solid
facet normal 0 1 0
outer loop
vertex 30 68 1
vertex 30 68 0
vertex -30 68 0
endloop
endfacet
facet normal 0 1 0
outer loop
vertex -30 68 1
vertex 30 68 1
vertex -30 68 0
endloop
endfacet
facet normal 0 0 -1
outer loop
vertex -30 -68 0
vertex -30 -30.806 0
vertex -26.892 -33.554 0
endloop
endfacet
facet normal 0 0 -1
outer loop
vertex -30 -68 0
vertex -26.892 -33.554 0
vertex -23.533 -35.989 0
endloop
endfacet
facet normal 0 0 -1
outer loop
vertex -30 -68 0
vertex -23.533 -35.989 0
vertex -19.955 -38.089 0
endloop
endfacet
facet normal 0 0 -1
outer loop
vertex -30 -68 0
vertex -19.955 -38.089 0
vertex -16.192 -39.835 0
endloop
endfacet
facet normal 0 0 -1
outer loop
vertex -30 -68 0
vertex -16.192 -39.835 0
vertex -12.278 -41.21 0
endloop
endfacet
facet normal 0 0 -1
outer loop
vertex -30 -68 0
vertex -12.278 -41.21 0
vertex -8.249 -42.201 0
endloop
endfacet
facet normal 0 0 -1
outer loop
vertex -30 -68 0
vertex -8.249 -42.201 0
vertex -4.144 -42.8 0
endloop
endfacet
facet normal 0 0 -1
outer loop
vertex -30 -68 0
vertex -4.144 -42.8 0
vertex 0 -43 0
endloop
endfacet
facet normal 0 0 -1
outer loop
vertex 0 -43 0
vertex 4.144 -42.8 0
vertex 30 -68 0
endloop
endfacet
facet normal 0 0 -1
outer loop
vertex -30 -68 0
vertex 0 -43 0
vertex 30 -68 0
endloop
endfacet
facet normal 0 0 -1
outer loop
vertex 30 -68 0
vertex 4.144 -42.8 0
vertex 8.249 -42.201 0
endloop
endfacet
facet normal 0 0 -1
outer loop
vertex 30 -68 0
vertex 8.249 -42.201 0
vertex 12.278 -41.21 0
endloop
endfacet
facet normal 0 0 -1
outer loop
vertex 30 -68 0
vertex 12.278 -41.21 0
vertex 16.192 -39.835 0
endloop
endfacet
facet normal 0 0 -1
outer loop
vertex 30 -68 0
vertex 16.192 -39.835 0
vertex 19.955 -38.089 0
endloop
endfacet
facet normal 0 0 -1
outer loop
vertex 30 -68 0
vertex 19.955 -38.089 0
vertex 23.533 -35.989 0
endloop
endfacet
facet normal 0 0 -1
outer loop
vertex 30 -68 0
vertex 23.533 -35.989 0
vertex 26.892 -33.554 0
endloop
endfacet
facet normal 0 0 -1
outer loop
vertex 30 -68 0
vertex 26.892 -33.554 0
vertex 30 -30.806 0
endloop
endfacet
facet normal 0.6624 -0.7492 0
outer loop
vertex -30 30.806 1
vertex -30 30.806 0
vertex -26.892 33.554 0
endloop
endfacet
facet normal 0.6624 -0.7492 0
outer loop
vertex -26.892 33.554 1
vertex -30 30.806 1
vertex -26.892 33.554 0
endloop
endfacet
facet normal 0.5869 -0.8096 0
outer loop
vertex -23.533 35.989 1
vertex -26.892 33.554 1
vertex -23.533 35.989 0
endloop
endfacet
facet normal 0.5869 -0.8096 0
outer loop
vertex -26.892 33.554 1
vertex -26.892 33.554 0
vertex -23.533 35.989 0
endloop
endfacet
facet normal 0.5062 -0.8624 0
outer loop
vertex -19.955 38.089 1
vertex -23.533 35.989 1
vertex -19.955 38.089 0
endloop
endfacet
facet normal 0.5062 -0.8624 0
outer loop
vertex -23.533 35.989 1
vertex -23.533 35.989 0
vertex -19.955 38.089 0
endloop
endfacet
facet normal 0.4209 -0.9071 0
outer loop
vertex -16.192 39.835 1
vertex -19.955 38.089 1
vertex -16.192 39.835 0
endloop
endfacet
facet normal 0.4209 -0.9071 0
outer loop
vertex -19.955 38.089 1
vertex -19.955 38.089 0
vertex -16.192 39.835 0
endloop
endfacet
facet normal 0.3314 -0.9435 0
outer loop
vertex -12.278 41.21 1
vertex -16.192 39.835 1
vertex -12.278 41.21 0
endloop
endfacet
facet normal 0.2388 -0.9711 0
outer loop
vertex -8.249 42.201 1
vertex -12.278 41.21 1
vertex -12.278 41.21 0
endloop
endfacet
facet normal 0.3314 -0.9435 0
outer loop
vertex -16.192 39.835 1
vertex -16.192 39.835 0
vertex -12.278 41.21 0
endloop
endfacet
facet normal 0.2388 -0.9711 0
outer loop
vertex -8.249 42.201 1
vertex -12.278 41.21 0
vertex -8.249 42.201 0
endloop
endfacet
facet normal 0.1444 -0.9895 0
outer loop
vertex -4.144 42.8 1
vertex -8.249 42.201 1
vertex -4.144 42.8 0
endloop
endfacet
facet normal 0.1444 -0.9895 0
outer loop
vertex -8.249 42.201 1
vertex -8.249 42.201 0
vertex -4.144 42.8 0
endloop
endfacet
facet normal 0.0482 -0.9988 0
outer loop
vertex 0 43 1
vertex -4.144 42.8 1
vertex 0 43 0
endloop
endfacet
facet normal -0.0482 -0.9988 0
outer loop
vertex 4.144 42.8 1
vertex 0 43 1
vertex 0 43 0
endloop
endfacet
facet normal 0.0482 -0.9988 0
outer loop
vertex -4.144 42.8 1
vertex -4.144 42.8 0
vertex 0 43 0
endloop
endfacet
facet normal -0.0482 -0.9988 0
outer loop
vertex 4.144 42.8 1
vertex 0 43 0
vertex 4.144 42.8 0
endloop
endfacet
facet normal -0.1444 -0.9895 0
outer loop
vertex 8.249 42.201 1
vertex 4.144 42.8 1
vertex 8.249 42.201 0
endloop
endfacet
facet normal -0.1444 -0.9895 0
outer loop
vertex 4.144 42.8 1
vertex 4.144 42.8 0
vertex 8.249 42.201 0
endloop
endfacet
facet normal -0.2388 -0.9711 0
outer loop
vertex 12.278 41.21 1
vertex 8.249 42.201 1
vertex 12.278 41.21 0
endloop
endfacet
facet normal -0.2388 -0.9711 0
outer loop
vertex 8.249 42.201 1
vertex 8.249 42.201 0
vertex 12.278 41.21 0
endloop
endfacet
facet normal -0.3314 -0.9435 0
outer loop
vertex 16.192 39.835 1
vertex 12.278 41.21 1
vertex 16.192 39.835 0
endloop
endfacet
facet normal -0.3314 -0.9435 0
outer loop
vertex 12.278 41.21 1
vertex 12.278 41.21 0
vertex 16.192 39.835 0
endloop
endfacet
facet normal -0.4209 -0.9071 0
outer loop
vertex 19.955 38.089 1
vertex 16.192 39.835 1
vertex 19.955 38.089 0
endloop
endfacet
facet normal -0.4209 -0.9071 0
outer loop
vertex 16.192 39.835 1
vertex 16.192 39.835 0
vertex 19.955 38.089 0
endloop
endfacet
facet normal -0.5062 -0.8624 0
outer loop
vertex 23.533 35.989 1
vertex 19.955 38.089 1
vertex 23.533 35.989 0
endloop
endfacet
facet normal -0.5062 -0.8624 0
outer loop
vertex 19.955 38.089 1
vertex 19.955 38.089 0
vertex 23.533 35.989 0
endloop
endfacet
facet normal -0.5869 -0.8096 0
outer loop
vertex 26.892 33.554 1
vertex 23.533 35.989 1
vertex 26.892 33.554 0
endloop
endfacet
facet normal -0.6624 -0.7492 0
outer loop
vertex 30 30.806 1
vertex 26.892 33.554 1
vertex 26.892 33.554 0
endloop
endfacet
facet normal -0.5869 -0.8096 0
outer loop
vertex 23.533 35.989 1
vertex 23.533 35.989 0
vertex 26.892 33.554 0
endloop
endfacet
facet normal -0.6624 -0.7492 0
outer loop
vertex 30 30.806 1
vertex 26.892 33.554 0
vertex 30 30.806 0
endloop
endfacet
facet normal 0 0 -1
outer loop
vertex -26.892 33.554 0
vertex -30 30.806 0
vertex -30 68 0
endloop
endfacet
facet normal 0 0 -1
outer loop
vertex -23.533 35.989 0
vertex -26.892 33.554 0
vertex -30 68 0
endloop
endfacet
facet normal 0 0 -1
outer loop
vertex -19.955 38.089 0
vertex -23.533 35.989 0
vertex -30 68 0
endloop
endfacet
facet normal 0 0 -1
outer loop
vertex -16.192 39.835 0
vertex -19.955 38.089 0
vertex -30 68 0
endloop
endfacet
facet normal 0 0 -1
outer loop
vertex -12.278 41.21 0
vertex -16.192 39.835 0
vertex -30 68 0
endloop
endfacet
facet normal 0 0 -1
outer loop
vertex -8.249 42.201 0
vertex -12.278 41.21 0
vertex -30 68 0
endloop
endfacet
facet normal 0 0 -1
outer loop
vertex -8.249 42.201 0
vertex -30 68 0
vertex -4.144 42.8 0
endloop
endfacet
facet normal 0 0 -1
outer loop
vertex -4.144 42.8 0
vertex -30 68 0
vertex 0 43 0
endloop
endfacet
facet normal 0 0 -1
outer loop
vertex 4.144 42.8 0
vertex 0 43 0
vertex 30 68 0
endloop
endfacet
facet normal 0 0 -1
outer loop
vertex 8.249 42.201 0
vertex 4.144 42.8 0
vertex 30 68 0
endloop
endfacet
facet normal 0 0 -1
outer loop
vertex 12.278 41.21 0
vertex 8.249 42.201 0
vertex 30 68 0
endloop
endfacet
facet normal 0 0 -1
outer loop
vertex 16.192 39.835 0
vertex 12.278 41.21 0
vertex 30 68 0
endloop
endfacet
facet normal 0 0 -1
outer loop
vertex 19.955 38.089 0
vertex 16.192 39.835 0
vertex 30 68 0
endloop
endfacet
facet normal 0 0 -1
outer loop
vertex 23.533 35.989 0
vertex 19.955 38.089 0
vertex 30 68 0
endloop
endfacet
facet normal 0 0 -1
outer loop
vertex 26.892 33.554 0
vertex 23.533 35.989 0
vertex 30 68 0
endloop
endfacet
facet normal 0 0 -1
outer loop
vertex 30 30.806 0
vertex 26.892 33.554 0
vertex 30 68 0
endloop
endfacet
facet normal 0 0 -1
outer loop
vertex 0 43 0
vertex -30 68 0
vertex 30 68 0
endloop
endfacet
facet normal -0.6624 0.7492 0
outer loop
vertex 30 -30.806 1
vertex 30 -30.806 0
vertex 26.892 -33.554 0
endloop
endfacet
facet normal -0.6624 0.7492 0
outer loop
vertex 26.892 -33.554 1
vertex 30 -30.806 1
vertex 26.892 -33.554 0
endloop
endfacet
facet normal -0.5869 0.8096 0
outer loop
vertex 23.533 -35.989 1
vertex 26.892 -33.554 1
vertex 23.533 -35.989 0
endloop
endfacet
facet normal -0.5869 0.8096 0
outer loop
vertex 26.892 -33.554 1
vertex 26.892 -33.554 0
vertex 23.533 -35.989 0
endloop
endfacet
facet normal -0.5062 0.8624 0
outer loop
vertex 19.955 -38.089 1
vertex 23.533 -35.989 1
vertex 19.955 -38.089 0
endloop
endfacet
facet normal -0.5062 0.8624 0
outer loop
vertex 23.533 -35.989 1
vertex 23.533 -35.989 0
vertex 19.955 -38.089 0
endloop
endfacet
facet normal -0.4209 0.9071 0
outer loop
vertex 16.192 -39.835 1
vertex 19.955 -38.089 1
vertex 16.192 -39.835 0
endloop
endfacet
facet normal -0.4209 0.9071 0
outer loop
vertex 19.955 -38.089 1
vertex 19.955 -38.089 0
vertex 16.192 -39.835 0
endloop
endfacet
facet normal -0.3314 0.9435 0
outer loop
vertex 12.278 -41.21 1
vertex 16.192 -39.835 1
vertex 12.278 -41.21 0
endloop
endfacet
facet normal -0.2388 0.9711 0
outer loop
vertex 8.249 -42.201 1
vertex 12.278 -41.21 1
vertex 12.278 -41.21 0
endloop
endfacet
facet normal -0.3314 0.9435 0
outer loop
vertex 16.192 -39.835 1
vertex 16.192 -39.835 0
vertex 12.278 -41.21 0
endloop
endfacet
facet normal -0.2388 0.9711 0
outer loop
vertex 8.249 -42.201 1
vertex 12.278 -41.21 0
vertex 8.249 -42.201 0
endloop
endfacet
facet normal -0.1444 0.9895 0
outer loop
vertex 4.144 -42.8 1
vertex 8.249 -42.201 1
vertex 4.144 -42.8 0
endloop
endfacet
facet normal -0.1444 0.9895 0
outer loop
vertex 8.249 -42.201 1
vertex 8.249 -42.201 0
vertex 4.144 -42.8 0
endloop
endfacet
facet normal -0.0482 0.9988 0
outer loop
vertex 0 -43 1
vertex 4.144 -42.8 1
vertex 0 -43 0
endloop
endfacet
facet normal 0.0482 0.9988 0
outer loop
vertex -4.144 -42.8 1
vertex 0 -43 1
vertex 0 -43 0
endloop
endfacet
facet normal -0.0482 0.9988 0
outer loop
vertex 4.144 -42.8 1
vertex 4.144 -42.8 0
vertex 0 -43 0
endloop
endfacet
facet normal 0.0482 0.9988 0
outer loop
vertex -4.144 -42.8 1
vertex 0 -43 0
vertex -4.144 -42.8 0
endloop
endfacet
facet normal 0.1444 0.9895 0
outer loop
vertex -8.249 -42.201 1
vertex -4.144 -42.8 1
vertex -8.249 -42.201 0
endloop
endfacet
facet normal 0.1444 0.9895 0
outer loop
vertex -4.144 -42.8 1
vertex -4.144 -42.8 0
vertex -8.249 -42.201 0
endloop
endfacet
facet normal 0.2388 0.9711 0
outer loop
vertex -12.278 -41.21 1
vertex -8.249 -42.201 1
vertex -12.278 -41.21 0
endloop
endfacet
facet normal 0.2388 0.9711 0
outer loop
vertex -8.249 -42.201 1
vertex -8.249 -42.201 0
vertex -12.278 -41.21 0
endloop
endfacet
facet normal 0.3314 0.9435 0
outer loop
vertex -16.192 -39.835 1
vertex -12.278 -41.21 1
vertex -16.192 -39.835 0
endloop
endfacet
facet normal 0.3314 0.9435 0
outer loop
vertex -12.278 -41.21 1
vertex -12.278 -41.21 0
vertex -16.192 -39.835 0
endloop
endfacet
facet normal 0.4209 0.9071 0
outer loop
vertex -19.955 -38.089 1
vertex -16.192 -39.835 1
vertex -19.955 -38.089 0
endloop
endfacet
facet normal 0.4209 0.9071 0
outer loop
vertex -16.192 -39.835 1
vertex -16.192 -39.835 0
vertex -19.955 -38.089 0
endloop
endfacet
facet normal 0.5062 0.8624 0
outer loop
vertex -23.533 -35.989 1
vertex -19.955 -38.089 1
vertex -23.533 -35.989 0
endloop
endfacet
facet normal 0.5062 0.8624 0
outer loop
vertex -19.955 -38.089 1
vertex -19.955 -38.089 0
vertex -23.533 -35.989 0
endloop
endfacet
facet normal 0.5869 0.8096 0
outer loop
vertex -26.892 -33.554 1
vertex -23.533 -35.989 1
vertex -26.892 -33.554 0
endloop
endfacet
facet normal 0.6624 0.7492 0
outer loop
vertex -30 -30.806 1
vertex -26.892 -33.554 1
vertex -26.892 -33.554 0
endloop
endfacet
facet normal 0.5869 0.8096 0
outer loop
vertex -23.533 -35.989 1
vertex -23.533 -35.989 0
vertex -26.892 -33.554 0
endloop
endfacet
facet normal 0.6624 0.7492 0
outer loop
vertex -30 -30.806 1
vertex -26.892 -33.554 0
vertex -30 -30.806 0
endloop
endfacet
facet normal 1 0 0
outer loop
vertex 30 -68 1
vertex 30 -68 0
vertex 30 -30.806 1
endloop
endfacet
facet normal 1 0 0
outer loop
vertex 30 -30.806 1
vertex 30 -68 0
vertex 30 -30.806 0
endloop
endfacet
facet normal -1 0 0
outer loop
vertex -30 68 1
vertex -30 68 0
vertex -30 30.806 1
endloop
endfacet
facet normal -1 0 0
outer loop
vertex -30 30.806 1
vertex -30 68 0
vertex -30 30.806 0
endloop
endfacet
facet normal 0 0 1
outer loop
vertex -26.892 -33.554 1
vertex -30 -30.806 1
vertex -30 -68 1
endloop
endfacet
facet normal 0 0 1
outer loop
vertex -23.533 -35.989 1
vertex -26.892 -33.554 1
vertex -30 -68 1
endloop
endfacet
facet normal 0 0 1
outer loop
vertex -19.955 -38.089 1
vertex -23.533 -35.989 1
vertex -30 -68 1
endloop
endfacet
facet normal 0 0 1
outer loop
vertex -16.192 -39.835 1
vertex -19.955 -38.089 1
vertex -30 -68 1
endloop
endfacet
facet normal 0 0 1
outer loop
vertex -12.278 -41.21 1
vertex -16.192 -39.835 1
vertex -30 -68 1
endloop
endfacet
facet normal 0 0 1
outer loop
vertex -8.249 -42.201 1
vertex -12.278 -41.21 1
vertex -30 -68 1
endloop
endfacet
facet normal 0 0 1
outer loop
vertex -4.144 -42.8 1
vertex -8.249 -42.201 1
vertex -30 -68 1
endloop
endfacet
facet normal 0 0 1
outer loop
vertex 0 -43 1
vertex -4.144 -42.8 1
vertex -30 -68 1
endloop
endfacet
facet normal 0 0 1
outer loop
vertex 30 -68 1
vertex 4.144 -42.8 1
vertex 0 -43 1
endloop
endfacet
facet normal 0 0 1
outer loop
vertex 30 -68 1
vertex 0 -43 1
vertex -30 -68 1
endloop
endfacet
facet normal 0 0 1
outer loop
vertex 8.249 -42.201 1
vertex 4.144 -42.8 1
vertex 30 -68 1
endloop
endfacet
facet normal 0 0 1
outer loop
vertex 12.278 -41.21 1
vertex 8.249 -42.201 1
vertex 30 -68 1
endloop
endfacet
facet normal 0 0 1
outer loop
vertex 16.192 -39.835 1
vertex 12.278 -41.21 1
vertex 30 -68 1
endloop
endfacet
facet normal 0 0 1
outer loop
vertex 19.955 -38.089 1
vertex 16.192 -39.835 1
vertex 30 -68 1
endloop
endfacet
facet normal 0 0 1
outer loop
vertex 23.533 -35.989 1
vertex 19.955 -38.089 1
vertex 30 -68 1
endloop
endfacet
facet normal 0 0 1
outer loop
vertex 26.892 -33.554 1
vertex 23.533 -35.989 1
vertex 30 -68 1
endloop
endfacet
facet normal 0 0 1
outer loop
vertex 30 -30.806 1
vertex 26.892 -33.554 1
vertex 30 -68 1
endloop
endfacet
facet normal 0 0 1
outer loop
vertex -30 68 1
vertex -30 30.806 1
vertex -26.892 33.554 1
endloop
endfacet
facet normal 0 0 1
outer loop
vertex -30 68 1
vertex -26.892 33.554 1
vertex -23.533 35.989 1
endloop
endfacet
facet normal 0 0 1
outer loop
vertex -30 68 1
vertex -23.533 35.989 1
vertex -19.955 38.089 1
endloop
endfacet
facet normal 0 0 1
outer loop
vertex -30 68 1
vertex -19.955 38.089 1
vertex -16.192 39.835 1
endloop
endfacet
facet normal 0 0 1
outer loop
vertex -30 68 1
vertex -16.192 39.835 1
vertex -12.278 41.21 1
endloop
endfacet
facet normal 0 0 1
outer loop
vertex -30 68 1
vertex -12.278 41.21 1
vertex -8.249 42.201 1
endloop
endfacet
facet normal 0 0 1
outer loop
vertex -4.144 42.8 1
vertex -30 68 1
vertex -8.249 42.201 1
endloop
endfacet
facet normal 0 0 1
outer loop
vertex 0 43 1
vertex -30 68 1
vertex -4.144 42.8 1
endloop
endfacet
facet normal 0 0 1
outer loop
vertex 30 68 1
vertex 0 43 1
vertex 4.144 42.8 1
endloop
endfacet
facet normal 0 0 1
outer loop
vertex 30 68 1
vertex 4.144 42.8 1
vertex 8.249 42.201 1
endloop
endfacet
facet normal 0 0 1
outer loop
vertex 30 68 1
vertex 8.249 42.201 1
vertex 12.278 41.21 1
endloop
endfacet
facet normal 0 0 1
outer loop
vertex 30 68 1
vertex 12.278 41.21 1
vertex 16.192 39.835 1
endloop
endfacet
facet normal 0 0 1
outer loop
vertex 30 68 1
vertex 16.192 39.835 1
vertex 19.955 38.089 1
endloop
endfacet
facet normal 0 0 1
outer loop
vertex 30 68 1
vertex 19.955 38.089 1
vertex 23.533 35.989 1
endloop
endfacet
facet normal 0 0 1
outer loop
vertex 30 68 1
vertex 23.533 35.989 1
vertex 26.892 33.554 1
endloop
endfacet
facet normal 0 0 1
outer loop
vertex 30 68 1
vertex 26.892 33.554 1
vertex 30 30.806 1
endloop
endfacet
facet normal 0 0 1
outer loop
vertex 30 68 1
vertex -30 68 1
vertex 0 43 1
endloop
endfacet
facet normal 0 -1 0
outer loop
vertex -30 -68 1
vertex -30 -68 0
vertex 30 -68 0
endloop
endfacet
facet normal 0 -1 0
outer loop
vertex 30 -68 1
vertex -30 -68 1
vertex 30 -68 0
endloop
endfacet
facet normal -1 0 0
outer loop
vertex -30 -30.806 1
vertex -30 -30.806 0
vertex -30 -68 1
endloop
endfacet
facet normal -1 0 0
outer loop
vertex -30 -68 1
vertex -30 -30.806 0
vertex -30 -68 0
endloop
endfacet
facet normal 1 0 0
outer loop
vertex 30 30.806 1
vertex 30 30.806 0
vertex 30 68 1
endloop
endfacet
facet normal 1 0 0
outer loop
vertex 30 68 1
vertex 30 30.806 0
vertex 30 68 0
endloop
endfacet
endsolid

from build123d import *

# Parameters (mm, degrees)
SALIENTE_EXTRUIR1_DEPTH   = 1
SALIENTE_EXTRUIR1_2_DEPTH = 1


with BuildPart() as part:
    # Croquis1 → Saliente-Extruir1 (new body)
    with BuildSketch(Plane.XY):
        with BuildLine():
            Line((30, 68), (-30, 68))
            Line((-30, 68), (-30, 30.805843601))
            ThreePointArc((-30, 30.805843601), (0, 43), (30, 30.805843601))
            Line((30, 30.805843601), (30, 68))
        make_face()
    extrude(amount=SALIENTE_EXTRUIR1_DEPTH)


with BuildPart() as body_2:
    # Croquis1 → Saliente-Extruir1 2 (new body)
    with BuildSketch(Plane.XY):
        with BuildLine():
            ThreePointArc((30, -30.805843601), (0, -43), (-30, -30.805843601))
            Line((-30, -30.805843601), (-30, -68))
            Line((-30, -68), (30, -68))
            Line((30, -68), (30, -30.805843601))
        make_face()
    extrude(amount=SALIENTE_EXTRUIR1_2_DEPTH)


solid = Compound([part.part, body_2.part])
